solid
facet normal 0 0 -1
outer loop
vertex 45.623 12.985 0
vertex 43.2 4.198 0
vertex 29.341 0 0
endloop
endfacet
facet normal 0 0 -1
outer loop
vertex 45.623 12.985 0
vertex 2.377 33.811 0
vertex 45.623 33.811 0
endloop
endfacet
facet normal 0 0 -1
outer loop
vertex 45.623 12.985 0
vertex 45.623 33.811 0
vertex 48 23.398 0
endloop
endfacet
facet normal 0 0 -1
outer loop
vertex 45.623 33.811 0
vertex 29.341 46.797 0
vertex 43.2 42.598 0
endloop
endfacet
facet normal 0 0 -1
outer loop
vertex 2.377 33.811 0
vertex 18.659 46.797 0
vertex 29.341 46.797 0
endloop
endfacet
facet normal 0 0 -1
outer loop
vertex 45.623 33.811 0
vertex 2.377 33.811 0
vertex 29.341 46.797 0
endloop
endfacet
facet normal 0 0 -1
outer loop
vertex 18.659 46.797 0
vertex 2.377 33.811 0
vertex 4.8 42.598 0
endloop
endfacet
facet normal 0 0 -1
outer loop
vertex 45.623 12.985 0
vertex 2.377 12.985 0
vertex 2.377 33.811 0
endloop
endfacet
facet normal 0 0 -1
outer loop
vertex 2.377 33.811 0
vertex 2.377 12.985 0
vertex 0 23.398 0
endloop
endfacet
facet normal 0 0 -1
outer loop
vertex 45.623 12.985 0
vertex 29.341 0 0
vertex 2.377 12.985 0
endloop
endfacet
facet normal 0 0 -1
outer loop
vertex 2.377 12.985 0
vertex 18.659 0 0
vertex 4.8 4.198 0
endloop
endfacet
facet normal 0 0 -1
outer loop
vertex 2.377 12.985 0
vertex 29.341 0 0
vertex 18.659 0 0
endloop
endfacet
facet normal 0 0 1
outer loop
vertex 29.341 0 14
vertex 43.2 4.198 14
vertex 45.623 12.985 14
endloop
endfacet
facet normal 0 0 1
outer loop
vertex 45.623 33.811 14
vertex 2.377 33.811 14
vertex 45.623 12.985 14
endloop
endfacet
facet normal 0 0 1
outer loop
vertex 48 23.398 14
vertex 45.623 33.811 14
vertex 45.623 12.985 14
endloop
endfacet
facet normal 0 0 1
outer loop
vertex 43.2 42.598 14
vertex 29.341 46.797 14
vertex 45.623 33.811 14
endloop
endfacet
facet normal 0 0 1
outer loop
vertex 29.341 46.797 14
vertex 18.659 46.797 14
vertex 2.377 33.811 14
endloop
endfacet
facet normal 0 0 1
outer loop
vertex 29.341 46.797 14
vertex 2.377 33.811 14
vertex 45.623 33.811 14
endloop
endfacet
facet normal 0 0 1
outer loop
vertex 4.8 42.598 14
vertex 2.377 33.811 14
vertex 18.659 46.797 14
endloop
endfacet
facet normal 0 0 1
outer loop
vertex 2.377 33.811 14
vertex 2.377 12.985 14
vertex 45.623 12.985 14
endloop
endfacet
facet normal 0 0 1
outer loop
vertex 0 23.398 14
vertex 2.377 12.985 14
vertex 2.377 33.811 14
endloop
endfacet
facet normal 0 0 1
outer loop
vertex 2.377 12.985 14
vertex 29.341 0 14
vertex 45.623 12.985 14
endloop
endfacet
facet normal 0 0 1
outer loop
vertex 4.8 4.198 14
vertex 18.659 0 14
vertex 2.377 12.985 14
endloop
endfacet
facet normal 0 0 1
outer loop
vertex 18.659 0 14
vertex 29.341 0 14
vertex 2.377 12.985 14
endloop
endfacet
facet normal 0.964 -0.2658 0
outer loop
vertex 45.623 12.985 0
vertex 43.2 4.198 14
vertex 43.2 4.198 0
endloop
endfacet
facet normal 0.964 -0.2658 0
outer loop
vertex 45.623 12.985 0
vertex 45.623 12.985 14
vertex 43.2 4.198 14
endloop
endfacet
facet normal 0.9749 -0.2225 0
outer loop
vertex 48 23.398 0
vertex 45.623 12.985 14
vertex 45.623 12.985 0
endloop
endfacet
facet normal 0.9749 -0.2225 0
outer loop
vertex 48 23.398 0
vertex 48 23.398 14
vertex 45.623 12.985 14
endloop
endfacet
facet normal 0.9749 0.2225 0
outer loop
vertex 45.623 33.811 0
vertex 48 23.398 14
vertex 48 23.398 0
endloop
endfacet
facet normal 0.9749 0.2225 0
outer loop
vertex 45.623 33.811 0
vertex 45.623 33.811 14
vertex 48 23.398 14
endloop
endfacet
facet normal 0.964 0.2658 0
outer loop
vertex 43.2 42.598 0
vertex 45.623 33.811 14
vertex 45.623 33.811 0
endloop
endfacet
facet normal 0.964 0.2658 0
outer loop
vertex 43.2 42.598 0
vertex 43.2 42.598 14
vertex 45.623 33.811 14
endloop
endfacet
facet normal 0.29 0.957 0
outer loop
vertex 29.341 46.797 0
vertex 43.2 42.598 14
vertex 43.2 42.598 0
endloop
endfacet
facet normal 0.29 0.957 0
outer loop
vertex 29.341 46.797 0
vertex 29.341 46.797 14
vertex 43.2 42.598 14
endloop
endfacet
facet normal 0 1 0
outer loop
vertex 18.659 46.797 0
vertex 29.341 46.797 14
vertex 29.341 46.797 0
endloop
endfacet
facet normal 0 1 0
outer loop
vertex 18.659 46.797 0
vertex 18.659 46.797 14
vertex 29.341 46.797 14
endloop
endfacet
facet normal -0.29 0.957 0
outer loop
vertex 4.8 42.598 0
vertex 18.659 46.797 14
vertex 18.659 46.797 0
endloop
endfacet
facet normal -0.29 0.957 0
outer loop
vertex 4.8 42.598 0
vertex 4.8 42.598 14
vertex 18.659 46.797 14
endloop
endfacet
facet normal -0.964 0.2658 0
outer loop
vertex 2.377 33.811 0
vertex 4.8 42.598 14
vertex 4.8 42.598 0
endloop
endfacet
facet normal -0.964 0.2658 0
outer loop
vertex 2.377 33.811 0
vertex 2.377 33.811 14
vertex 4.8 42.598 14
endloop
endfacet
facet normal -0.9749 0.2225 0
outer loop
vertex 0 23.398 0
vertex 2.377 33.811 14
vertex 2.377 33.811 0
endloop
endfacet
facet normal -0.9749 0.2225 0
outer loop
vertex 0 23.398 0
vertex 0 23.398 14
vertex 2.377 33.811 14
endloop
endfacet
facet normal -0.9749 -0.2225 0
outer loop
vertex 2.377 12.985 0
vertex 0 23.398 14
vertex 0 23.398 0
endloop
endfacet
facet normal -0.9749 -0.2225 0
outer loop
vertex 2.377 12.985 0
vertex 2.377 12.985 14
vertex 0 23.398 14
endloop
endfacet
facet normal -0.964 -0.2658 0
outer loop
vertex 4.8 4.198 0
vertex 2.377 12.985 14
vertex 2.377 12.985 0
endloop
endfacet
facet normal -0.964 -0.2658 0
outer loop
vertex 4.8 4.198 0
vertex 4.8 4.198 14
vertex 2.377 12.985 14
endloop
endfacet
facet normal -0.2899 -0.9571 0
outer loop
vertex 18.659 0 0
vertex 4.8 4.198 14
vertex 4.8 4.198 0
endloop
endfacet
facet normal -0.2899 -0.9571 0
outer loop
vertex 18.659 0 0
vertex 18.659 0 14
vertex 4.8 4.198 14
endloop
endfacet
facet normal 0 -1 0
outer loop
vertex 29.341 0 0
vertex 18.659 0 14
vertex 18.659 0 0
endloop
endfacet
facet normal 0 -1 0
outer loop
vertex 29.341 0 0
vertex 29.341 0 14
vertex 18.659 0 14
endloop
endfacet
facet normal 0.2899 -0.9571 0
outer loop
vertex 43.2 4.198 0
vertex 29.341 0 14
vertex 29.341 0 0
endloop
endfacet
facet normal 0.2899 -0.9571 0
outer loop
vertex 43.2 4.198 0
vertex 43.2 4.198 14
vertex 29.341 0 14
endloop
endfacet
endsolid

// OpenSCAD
$fn = 32;

// ----------------------------------------------------------------------
// Flat adaptor: hex_disc, 14 mm thick
// ----------------------------------------------------------------------

// --- parameters (mm) ---
profile_height = 14;      // extrusion height
profile_points = 14;      // points of the closed outline

profile = [[0, 23.398], [2.377, 12.985], [4.8, 4.198], [18.659, 0], [29.341, 0], [43.2, 4.198], [45.623, 12.985], [48, 23.398], [45.623, 33.811], [43.2, 42.598], [29.341, 46.797], [18.659, 46.797], [4.8, 42.598], [2.377, 33.811]];  // single closed polygon, 14 points, counter clockwise

// --- the one profile operation ---
linear_extrude(height = profile_height) polygon(points = profile);
